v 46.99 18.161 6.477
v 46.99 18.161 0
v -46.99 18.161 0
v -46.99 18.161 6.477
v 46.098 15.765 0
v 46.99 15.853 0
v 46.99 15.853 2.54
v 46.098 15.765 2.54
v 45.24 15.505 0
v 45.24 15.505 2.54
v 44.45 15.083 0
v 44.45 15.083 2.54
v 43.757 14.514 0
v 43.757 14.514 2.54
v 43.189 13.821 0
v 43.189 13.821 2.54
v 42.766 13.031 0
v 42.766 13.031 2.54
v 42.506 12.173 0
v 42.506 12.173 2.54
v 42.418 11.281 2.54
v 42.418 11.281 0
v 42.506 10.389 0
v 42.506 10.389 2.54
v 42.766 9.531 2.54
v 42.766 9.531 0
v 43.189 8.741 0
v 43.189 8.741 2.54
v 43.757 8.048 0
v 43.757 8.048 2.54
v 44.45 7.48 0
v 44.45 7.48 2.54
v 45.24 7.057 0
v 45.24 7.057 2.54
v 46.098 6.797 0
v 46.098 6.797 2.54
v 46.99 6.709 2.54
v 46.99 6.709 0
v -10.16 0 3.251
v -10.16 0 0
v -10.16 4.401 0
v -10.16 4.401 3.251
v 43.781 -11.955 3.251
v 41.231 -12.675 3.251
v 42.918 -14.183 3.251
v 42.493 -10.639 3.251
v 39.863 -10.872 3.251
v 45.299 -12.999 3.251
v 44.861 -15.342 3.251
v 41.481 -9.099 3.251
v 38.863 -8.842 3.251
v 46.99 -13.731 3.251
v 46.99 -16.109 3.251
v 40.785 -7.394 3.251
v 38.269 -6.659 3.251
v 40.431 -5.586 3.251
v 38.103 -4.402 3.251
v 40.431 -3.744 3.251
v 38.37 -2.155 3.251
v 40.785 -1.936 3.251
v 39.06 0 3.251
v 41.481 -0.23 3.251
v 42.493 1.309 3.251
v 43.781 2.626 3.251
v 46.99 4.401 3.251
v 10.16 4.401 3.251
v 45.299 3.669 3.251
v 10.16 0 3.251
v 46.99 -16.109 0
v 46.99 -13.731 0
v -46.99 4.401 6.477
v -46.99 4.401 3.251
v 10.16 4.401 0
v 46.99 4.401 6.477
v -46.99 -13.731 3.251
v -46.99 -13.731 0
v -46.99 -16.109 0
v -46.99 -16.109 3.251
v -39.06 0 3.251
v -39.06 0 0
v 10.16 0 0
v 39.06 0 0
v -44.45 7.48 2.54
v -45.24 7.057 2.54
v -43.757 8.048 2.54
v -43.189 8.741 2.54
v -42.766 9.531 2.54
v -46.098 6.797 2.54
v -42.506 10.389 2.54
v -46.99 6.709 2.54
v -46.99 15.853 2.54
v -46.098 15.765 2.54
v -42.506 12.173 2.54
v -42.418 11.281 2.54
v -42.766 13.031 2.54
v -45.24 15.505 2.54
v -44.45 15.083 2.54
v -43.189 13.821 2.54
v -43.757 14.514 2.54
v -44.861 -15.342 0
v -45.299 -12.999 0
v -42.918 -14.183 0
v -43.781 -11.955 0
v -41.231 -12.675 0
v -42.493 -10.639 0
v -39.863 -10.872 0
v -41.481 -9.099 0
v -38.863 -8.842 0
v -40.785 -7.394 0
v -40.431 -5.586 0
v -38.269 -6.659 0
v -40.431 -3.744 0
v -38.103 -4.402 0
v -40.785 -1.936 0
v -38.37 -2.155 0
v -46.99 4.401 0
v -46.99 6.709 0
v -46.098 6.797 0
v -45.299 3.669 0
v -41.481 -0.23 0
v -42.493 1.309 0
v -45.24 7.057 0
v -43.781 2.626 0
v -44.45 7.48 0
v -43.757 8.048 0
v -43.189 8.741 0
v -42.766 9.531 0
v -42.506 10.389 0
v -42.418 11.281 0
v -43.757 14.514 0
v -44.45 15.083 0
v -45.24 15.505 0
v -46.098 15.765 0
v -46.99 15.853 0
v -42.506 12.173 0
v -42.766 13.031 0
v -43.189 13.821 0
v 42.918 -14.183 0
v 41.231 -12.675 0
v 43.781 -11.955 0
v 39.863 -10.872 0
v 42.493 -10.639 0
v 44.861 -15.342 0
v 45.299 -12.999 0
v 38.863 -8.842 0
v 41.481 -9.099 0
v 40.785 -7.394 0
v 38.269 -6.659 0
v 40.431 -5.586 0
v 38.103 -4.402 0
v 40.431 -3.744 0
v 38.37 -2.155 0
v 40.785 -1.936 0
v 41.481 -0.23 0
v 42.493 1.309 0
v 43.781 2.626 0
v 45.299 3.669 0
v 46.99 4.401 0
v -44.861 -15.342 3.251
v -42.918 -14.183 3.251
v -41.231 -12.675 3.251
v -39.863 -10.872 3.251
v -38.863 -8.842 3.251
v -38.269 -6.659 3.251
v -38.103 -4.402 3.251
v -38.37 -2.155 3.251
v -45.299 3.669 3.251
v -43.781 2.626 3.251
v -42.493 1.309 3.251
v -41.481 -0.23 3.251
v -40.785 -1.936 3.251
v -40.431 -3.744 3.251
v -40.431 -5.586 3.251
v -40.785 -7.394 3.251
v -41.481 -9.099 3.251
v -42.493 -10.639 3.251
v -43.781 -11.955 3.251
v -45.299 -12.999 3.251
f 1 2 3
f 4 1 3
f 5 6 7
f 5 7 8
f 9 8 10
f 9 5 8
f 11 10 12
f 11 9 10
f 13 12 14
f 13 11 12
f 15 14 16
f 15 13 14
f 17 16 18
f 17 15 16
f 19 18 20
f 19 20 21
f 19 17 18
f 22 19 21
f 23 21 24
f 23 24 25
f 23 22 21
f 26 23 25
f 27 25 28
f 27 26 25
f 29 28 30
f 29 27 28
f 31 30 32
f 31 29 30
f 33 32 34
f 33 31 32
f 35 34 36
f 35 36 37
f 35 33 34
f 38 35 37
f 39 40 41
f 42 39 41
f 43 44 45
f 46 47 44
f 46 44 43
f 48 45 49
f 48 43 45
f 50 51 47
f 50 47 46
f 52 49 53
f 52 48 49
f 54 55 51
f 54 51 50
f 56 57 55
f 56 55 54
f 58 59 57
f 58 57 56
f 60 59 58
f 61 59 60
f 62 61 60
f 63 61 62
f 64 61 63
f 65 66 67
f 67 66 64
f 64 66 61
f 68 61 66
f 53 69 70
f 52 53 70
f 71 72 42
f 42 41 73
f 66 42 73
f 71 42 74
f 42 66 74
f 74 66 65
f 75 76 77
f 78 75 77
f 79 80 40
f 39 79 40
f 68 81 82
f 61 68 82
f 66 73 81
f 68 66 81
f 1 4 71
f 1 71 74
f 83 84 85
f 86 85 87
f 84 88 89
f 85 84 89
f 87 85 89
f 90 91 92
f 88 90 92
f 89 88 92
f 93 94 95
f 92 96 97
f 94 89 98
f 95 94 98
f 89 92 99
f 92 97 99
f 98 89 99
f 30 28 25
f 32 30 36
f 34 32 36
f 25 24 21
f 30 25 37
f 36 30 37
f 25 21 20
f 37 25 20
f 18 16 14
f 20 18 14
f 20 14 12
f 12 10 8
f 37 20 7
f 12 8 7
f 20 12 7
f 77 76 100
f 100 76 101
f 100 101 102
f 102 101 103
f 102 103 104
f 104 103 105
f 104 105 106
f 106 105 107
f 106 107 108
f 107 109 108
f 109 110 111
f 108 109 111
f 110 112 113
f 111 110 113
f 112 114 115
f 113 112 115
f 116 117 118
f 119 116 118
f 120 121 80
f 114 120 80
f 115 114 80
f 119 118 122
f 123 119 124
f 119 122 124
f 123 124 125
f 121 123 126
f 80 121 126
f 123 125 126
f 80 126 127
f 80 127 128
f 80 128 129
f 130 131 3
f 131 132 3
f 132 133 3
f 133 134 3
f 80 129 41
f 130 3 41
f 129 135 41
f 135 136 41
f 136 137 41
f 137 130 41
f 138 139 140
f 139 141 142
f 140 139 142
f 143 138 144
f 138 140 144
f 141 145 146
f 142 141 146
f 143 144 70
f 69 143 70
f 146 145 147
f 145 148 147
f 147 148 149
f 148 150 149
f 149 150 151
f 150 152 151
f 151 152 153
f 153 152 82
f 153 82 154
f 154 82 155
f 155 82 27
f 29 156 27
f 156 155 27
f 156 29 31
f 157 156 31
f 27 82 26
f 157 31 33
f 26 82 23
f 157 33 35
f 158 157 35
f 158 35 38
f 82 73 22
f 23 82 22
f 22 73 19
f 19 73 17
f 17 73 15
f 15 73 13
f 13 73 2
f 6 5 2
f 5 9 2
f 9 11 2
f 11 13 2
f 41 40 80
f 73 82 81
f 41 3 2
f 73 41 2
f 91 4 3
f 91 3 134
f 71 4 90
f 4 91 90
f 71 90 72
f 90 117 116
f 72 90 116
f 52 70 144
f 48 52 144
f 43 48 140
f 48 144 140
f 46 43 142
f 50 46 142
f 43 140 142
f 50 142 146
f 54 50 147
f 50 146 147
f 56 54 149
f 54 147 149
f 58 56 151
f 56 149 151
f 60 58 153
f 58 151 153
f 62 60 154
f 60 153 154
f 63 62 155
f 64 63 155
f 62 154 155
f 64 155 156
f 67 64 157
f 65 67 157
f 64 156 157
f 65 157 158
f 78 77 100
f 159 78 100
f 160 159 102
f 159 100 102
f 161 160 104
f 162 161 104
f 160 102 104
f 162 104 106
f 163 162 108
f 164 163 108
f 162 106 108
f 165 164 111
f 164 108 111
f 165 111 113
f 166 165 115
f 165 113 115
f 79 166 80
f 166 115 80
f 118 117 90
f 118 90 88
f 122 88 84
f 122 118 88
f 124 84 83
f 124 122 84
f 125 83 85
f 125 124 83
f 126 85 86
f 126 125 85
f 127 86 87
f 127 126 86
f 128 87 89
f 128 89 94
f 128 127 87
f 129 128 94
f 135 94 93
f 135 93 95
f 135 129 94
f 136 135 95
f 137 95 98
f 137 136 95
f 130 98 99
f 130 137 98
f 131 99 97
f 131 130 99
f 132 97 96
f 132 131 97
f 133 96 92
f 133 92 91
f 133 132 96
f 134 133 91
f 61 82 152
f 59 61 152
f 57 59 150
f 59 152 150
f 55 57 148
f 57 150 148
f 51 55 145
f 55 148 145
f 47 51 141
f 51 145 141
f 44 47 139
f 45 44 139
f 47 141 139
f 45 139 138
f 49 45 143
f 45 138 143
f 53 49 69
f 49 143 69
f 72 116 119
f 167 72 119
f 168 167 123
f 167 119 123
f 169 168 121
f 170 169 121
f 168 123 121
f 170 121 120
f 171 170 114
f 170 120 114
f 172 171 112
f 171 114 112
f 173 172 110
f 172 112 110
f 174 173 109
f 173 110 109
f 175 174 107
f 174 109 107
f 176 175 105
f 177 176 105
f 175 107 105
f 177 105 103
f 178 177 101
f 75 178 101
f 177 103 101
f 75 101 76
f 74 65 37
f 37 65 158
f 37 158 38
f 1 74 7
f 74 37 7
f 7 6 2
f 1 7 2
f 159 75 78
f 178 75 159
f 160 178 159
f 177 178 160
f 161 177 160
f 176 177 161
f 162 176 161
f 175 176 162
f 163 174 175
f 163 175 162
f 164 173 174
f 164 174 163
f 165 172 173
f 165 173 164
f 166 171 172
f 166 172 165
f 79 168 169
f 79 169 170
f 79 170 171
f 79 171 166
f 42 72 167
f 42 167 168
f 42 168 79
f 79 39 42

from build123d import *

# Parameters (mm, degrees)
F1_DEPTH = 6.477
F2_DEPTH = 3.2512
F4_DEPTH = 2.54


with BuildPart() as f1:
    # F0 (on Top) → F1 (new body)
    with BuildSketch(Plane.XY):
        Polygon((46.99, 18.161), (-46.99, 18.161), (-46.99, 4.401166), (-10.16, 4.401166), (10.16, 4.401166), (46.99, 4.401166), align=None)
    extrude(amount=F1_DEPTH)

    # F0 (on Top) → F2 (join)
    with BuildSketch(Plane.XY):
        with BuildLine():
            Line((-10.16, 4.401166), (-46.99, 4.401166))
            ThreePointArc((-46.99, 4.401166), (-40.386, -4.664891), (-46.99, -13.730948))
            Line((-46.99, -13.730948), (-46.99, -16.108993))
            ThreePointArc((-46.99, -16.108993), (-39.314297, -9.881174), (-39.060262, 0))
            Line((-39.060262, 0), (-10.16, 0))
            Line((-10.16, 0), (-10.16, 4.401166))
        make_face()
        with BuildLine():
            ThreePointArc((46.99, -13.730948), (40.386, -4.664891), (46.99, 4.401166))
            Line((46.99, 4.401166), (10.16, 4.401166))
            Line((10.16, 4.401166), (10.16, 0))
            Line((10.16, 0), (39.060262, 0))
            ThreePointArc((39.060262, 0), (39.314297, -9.881174), (46.99, -16.108993))
            Line((46.99, -16.108993), (46.99, -13.730948))
        make_face()
    extrude(amount=F2_DEPTH)

    # F3 (on face) → F4 (cut)
    with BuildSketch(Plane.XY):
        with BuildLine():
            Line((-46.99, 15.853083), (-46.99, 6.709083))
            ThreePointArc((-46.99, 6.709083), (-42.418, 11.281083), (-46.99, 15.853083))
        make_face()
        with BuildLine():
            ThreePointArc((46.99, 15.853083), (42.418, 11.281083), (46.99, 6.709083))
            Line((46.99, 6.709083), (46.99, 15.853083))
        make_face()
    extrude(amount=F4_DEPTH, mode=Mode.SUBTRACT)


solid = f1.part
